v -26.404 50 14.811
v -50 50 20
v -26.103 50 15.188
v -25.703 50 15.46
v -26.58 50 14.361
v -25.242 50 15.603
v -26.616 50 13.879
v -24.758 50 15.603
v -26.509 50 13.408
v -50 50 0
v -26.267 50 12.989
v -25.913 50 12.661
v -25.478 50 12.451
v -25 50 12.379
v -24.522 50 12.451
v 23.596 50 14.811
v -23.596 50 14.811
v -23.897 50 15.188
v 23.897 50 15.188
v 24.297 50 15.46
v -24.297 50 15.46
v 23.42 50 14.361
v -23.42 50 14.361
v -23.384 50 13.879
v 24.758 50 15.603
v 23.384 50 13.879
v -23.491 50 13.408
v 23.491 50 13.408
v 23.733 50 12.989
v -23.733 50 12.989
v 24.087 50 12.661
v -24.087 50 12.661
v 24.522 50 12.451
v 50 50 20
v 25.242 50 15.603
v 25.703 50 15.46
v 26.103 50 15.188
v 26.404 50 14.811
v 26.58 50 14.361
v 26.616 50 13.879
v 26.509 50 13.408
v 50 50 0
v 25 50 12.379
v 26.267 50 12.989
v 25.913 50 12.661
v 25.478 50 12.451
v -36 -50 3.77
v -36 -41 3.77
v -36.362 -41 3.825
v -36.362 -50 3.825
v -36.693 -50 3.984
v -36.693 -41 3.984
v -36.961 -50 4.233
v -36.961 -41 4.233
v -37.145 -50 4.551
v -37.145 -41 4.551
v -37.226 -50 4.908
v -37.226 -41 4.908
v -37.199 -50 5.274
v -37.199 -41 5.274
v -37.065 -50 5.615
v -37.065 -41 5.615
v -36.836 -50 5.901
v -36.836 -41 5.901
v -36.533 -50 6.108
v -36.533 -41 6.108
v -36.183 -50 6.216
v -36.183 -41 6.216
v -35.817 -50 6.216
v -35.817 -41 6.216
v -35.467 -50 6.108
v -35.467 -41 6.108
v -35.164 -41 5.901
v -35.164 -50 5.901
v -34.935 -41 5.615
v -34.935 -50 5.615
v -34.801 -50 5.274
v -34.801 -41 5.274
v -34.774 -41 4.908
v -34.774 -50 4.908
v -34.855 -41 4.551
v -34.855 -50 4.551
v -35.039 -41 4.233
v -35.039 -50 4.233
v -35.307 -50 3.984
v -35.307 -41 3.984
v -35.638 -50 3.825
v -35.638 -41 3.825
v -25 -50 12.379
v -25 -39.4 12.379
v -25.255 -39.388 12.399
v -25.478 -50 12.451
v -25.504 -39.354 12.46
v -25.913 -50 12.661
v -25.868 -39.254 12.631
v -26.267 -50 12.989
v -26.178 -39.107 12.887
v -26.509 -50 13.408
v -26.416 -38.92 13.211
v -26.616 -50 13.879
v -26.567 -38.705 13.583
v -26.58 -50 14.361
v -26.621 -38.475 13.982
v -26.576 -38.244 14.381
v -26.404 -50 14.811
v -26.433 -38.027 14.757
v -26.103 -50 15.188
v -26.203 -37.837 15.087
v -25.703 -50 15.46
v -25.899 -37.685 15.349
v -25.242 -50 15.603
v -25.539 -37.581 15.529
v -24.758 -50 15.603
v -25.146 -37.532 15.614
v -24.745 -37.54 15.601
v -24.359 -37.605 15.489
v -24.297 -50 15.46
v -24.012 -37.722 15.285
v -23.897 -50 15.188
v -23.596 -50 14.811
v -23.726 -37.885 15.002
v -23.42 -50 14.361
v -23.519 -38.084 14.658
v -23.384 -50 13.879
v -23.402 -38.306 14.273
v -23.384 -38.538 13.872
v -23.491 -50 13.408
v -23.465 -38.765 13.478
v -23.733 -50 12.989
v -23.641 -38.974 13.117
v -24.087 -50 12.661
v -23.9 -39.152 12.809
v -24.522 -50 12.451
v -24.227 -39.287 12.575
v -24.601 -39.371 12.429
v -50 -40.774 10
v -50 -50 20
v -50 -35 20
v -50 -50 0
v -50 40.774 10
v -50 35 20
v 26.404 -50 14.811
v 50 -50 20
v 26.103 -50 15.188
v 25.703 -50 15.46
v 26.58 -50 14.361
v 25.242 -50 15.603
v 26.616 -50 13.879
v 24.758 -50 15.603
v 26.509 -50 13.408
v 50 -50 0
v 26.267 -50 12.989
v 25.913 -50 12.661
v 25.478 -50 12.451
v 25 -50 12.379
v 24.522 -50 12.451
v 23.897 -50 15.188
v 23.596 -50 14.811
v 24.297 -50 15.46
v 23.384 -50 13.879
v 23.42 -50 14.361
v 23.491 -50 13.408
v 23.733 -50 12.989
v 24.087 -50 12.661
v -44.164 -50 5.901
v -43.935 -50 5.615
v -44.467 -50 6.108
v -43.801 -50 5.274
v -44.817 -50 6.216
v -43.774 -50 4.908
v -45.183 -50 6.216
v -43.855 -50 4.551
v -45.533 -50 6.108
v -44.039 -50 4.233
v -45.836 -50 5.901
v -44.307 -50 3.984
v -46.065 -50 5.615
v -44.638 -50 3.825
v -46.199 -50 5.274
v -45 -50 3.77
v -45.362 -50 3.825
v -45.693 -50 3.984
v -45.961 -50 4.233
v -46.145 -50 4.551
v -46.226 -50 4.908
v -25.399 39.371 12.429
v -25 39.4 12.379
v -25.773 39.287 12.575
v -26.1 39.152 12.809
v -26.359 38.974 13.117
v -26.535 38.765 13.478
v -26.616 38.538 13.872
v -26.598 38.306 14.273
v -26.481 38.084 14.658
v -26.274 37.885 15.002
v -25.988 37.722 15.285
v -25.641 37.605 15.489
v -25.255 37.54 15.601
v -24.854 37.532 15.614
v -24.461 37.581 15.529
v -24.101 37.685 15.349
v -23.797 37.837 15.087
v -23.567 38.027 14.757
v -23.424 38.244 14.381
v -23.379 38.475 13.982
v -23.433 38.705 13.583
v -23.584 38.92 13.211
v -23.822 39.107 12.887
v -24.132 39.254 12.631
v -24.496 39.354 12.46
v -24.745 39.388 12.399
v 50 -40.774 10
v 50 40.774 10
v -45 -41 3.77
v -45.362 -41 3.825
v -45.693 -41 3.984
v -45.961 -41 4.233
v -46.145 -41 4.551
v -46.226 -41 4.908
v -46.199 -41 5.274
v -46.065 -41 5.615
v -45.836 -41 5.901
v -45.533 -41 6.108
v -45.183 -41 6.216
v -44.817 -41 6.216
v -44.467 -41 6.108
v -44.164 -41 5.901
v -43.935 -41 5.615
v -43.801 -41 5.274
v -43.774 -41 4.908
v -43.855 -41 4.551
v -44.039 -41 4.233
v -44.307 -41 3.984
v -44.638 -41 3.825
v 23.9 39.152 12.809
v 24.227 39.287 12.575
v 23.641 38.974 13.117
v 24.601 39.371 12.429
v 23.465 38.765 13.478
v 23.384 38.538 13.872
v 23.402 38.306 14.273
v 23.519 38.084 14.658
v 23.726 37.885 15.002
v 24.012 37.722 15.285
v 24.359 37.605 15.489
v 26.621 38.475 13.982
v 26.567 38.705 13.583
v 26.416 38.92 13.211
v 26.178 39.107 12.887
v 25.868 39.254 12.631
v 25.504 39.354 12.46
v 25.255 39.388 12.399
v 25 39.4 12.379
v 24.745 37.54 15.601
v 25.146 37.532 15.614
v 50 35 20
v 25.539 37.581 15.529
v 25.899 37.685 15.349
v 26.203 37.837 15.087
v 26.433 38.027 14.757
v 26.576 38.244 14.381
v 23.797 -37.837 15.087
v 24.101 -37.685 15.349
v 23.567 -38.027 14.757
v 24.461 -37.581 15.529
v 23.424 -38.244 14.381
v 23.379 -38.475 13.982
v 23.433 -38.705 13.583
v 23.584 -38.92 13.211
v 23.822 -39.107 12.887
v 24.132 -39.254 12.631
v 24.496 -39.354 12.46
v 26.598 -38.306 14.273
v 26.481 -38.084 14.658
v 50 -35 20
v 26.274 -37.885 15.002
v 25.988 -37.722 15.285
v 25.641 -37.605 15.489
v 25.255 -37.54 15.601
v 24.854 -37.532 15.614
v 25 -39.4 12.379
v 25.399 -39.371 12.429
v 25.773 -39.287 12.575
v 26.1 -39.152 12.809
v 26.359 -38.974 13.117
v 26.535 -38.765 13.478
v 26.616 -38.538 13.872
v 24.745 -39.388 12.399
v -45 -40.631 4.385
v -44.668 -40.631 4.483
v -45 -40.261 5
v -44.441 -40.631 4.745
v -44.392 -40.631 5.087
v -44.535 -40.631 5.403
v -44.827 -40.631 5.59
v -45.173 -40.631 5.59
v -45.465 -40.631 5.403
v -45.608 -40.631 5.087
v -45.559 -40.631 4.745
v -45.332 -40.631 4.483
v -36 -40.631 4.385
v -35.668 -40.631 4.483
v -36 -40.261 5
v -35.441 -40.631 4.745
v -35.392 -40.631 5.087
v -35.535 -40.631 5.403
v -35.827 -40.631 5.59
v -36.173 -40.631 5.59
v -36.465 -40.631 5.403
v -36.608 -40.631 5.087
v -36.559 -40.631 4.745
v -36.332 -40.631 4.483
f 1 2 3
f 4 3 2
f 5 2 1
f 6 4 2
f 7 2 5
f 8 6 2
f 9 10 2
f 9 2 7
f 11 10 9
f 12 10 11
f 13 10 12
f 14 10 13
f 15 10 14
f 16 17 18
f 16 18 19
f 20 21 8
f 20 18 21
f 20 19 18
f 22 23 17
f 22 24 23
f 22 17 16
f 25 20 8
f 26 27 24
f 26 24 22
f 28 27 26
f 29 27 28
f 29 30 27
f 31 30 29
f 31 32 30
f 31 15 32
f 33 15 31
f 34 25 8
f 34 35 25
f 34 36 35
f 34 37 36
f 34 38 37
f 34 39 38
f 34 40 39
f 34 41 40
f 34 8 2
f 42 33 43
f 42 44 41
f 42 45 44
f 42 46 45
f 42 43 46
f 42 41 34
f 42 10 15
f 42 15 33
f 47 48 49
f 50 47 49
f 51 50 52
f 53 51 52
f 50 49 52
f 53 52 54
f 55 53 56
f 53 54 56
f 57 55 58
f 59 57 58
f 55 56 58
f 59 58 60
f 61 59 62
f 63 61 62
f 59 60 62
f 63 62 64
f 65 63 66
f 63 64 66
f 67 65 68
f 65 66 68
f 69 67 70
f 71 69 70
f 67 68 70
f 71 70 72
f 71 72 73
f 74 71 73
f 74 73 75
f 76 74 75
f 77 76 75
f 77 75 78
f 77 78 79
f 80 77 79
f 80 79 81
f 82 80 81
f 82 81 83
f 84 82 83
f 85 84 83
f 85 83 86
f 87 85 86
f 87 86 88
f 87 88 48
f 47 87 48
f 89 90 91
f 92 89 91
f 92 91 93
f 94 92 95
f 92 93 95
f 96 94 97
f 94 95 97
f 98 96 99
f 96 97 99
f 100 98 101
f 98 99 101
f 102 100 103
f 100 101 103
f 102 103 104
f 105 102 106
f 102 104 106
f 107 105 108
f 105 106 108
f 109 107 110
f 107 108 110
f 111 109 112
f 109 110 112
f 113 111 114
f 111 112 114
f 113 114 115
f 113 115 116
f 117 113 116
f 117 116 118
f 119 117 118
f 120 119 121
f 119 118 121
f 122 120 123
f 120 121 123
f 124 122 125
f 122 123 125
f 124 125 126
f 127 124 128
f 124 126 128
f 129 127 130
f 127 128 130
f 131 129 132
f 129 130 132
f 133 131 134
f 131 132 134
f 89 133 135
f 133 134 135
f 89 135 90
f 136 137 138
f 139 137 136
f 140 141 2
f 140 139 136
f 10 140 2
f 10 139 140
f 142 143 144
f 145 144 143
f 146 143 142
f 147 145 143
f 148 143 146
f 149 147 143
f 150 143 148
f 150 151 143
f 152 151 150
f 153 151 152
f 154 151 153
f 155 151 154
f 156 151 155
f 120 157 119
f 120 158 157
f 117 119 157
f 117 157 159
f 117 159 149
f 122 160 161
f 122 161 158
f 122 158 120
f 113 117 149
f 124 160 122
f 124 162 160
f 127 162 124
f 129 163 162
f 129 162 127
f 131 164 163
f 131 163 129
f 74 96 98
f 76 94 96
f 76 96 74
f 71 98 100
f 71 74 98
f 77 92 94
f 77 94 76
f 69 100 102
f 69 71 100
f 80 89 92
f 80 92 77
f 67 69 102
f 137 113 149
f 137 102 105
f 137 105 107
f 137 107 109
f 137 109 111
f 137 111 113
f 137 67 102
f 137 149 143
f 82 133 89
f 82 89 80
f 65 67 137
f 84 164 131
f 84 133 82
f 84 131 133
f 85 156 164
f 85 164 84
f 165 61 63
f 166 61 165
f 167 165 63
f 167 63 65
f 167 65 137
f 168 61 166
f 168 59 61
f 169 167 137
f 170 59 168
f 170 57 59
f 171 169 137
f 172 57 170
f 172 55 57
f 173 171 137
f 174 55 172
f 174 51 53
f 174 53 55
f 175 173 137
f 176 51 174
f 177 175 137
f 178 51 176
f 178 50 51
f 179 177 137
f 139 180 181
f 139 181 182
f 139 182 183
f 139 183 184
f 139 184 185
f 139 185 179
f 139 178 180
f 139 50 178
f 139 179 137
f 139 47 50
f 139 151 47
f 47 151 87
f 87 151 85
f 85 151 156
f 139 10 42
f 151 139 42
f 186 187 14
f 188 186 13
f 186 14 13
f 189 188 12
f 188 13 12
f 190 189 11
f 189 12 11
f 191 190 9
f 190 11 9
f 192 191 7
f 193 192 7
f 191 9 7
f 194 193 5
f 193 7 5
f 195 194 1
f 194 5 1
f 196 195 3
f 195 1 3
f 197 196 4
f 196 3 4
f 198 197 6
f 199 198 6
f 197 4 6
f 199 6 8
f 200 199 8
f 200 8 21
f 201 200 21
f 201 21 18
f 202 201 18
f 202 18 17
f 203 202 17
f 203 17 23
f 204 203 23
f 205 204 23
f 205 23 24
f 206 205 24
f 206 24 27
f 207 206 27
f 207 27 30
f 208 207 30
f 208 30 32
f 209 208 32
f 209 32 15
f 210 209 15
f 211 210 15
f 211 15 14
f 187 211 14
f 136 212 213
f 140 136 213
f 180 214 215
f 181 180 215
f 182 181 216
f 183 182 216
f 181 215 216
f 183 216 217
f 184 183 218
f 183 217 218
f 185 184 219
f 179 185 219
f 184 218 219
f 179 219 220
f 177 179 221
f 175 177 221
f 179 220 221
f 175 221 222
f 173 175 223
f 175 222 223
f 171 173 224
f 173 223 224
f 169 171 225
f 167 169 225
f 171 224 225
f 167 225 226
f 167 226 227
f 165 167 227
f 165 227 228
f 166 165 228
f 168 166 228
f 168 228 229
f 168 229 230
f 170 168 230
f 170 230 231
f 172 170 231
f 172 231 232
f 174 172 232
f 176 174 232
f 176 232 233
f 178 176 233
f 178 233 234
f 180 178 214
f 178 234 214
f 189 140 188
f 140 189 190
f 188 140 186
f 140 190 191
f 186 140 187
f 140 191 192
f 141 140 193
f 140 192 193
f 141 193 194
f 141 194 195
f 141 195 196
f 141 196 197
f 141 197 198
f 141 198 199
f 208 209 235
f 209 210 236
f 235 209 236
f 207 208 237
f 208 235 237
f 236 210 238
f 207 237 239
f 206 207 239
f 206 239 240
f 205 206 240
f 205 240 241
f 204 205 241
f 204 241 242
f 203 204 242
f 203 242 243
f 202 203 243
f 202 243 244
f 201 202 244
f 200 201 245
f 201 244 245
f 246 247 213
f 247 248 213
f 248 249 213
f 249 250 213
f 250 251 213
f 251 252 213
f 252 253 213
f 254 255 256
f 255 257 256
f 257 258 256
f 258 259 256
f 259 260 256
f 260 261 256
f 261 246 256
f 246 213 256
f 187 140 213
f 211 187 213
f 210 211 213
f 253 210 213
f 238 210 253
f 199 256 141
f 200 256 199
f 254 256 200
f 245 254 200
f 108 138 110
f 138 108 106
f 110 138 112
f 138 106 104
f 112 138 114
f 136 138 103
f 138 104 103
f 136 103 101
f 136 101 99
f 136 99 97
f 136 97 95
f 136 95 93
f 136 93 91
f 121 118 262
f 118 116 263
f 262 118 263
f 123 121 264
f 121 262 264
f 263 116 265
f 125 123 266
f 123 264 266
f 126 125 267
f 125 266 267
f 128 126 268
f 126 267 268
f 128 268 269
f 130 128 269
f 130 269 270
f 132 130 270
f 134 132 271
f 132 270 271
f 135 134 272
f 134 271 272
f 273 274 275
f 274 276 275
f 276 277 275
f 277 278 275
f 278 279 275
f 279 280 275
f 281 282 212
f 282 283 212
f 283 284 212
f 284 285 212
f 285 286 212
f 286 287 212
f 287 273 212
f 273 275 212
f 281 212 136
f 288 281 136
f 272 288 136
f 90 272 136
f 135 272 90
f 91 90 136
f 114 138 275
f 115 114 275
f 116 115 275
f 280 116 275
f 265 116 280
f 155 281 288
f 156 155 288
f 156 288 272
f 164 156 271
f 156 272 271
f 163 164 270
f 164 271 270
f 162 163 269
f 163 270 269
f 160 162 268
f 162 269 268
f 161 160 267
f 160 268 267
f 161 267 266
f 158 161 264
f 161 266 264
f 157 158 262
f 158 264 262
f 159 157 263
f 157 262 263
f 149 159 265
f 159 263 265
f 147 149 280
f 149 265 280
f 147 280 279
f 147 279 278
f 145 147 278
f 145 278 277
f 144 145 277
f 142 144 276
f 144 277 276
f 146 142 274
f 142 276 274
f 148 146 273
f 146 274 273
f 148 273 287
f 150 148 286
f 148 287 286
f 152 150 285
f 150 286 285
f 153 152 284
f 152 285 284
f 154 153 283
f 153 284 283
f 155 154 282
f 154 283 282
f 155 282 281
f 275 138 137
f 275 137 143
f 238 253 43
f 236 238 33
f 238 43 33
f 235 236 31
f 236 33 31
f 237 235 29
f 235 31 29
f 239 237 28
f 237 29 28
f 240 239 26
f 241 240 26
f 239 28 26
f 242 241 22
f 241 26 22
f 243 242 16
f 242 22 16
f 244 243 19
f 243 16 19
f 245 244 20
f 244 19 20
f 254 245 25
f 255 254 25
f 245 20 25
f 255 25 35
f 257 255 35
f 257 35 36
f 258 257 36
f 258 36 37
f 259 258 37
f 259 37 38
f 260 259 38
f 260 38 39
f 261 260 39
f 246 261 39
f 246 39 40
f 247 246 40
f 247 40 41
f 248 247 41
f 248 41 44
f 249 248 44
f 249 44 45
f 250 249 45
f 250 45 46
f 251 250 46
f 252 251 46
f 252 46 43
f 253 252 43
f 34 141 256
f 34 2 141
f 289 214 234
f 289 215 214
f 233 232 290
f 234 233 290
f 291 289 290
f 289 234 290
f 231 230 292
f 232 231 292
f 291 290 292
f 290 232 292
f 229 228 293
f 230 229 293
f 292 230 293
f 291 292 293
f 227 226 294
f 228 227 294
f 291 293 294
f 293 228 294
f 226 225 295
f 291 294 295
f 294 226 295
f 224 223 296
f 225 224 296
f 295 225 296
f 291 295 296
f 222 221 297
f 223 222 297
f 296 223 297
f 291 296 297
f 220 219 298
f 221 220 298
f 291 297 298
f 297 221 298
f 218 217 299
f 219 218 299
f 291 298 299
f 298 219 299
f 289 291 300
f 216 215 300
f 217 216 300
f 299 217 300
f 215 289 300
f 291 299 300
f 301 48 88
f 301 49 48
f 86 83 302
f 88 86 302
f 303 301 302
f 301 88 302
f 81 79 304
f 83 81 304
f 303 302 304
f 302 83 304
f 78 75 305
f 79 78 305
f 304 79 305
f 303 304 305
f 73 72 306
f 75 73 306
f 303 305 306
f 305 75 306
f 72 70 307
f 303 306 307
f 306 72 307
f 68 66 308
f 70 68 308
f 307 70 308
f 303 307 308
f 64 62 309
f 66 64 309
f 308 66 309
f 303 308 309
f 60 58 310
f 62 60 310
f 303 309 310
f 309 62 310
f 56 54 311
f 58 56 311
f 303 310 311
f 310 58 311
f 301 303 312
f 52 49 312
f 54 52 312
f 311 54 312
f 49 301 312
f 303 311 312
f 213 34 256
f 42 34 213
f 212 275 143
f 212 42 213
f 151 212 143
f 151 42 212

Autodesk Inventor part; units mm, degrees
ref_plane "YZ Plane" through (0, 0, 0) normal (1, 0, 0) x (0, 1, 0)
ref_plane "XZ Plane" through (0, 0, 0) normal (0, 1, 0) x (-1, 0, 0)
ref_plane "XY Plane" through (0, 0, 0) normal (0, 0, 1) x (1, 0, 0)
sketch "Sketch1" plane through (0, 0, 0) normal (0, 0, 1) x (1, 0, 0)
  line L0 (-50, 50) -> (50, 50)
  line L1 (50, 50) -> (50, -50)
  line L2 (50, -50) -> (-50, -50)
  line L3 (-50, -50) -> (-50, 50)
  line L4 (0, 0) -> (0, 7.629) construction
  line L5 (0, 0) -> (6.8797, 0) construction
  dimension "d0" = 100
  dimension "d1" = 100
extrude "Extrusion1" add sketch "Sketch1" along normal blind 20
sketch "Sketch2" plane through (50, -50, 0) normal (1, 0, 0) x (0, 0, -1)
  line L0 (-20, 100) -> (-20, 0) projected
  line L1 (-20, 15) -> (-10, 9.2265)
  line L2 (-10, 9.2265) -> (-10, 90.7735)
  line L3 (-10, 90.7735) -> (-20, 85)
  line L4 (0, 0) -> (-20, 0) projected
  line L5 (0, 100) -> (-20, 100) projected
  point P0 (0, 50)
  dimension "d4" = 60
  dimension "d5" = 60
  dimension "d6" = 10
  dimension "d7" = 15
  dimension "d8" = 15
extrude "Extrusion2" cut sketch "Sketch2" against normal blind 118.25
sketch "Sketch3" plane through (-50, -50, 0) normal (0, -1, 0) x (1, 0, 0)
  line L0 (100, 10) -> (0, 10) projected
  line L1 (0, 0) -> (0, 20) projected
  line L2 (0, 20) -> (100, 20) projected
  line L3 (100, 0) -> (100, 20) projected
  point P0 (50, 0)
  point P1 (25, 14)
  point P2 (75, 14)
  dimension "d11" = 25
  dimension "d12" = 6
  dimension "d21" = 25
hole "Hole1" at (-25, -50, 14) at (25, -50, 14) direction (0, 1, 0) diameter 3.242 end through all thread size "M4x0.7" class "6H" standard "ISO Metric profile"
sketch "Sketch4" plane through (-50, -50, 0) normal (0, -1, 0) x (1, 0, 0)
  circle A0 centre (5, 5) radius 1.6 projected
  circle A1 centre (14, 5) radius 1.6 projected
  point P0 (50, 0)
hole "Hole2" at (-45, -50, 5) at (-36, -50, 5) direction (0, 1, 0) diameter 2.459 depth 9 tip angle 118 thread size "M3x0.5" class "6H" standard "ISO Metric profile"
properties part number "3d_LM-Welding_Tooling - Fixed base" material "Aluminium 6061-T6"
